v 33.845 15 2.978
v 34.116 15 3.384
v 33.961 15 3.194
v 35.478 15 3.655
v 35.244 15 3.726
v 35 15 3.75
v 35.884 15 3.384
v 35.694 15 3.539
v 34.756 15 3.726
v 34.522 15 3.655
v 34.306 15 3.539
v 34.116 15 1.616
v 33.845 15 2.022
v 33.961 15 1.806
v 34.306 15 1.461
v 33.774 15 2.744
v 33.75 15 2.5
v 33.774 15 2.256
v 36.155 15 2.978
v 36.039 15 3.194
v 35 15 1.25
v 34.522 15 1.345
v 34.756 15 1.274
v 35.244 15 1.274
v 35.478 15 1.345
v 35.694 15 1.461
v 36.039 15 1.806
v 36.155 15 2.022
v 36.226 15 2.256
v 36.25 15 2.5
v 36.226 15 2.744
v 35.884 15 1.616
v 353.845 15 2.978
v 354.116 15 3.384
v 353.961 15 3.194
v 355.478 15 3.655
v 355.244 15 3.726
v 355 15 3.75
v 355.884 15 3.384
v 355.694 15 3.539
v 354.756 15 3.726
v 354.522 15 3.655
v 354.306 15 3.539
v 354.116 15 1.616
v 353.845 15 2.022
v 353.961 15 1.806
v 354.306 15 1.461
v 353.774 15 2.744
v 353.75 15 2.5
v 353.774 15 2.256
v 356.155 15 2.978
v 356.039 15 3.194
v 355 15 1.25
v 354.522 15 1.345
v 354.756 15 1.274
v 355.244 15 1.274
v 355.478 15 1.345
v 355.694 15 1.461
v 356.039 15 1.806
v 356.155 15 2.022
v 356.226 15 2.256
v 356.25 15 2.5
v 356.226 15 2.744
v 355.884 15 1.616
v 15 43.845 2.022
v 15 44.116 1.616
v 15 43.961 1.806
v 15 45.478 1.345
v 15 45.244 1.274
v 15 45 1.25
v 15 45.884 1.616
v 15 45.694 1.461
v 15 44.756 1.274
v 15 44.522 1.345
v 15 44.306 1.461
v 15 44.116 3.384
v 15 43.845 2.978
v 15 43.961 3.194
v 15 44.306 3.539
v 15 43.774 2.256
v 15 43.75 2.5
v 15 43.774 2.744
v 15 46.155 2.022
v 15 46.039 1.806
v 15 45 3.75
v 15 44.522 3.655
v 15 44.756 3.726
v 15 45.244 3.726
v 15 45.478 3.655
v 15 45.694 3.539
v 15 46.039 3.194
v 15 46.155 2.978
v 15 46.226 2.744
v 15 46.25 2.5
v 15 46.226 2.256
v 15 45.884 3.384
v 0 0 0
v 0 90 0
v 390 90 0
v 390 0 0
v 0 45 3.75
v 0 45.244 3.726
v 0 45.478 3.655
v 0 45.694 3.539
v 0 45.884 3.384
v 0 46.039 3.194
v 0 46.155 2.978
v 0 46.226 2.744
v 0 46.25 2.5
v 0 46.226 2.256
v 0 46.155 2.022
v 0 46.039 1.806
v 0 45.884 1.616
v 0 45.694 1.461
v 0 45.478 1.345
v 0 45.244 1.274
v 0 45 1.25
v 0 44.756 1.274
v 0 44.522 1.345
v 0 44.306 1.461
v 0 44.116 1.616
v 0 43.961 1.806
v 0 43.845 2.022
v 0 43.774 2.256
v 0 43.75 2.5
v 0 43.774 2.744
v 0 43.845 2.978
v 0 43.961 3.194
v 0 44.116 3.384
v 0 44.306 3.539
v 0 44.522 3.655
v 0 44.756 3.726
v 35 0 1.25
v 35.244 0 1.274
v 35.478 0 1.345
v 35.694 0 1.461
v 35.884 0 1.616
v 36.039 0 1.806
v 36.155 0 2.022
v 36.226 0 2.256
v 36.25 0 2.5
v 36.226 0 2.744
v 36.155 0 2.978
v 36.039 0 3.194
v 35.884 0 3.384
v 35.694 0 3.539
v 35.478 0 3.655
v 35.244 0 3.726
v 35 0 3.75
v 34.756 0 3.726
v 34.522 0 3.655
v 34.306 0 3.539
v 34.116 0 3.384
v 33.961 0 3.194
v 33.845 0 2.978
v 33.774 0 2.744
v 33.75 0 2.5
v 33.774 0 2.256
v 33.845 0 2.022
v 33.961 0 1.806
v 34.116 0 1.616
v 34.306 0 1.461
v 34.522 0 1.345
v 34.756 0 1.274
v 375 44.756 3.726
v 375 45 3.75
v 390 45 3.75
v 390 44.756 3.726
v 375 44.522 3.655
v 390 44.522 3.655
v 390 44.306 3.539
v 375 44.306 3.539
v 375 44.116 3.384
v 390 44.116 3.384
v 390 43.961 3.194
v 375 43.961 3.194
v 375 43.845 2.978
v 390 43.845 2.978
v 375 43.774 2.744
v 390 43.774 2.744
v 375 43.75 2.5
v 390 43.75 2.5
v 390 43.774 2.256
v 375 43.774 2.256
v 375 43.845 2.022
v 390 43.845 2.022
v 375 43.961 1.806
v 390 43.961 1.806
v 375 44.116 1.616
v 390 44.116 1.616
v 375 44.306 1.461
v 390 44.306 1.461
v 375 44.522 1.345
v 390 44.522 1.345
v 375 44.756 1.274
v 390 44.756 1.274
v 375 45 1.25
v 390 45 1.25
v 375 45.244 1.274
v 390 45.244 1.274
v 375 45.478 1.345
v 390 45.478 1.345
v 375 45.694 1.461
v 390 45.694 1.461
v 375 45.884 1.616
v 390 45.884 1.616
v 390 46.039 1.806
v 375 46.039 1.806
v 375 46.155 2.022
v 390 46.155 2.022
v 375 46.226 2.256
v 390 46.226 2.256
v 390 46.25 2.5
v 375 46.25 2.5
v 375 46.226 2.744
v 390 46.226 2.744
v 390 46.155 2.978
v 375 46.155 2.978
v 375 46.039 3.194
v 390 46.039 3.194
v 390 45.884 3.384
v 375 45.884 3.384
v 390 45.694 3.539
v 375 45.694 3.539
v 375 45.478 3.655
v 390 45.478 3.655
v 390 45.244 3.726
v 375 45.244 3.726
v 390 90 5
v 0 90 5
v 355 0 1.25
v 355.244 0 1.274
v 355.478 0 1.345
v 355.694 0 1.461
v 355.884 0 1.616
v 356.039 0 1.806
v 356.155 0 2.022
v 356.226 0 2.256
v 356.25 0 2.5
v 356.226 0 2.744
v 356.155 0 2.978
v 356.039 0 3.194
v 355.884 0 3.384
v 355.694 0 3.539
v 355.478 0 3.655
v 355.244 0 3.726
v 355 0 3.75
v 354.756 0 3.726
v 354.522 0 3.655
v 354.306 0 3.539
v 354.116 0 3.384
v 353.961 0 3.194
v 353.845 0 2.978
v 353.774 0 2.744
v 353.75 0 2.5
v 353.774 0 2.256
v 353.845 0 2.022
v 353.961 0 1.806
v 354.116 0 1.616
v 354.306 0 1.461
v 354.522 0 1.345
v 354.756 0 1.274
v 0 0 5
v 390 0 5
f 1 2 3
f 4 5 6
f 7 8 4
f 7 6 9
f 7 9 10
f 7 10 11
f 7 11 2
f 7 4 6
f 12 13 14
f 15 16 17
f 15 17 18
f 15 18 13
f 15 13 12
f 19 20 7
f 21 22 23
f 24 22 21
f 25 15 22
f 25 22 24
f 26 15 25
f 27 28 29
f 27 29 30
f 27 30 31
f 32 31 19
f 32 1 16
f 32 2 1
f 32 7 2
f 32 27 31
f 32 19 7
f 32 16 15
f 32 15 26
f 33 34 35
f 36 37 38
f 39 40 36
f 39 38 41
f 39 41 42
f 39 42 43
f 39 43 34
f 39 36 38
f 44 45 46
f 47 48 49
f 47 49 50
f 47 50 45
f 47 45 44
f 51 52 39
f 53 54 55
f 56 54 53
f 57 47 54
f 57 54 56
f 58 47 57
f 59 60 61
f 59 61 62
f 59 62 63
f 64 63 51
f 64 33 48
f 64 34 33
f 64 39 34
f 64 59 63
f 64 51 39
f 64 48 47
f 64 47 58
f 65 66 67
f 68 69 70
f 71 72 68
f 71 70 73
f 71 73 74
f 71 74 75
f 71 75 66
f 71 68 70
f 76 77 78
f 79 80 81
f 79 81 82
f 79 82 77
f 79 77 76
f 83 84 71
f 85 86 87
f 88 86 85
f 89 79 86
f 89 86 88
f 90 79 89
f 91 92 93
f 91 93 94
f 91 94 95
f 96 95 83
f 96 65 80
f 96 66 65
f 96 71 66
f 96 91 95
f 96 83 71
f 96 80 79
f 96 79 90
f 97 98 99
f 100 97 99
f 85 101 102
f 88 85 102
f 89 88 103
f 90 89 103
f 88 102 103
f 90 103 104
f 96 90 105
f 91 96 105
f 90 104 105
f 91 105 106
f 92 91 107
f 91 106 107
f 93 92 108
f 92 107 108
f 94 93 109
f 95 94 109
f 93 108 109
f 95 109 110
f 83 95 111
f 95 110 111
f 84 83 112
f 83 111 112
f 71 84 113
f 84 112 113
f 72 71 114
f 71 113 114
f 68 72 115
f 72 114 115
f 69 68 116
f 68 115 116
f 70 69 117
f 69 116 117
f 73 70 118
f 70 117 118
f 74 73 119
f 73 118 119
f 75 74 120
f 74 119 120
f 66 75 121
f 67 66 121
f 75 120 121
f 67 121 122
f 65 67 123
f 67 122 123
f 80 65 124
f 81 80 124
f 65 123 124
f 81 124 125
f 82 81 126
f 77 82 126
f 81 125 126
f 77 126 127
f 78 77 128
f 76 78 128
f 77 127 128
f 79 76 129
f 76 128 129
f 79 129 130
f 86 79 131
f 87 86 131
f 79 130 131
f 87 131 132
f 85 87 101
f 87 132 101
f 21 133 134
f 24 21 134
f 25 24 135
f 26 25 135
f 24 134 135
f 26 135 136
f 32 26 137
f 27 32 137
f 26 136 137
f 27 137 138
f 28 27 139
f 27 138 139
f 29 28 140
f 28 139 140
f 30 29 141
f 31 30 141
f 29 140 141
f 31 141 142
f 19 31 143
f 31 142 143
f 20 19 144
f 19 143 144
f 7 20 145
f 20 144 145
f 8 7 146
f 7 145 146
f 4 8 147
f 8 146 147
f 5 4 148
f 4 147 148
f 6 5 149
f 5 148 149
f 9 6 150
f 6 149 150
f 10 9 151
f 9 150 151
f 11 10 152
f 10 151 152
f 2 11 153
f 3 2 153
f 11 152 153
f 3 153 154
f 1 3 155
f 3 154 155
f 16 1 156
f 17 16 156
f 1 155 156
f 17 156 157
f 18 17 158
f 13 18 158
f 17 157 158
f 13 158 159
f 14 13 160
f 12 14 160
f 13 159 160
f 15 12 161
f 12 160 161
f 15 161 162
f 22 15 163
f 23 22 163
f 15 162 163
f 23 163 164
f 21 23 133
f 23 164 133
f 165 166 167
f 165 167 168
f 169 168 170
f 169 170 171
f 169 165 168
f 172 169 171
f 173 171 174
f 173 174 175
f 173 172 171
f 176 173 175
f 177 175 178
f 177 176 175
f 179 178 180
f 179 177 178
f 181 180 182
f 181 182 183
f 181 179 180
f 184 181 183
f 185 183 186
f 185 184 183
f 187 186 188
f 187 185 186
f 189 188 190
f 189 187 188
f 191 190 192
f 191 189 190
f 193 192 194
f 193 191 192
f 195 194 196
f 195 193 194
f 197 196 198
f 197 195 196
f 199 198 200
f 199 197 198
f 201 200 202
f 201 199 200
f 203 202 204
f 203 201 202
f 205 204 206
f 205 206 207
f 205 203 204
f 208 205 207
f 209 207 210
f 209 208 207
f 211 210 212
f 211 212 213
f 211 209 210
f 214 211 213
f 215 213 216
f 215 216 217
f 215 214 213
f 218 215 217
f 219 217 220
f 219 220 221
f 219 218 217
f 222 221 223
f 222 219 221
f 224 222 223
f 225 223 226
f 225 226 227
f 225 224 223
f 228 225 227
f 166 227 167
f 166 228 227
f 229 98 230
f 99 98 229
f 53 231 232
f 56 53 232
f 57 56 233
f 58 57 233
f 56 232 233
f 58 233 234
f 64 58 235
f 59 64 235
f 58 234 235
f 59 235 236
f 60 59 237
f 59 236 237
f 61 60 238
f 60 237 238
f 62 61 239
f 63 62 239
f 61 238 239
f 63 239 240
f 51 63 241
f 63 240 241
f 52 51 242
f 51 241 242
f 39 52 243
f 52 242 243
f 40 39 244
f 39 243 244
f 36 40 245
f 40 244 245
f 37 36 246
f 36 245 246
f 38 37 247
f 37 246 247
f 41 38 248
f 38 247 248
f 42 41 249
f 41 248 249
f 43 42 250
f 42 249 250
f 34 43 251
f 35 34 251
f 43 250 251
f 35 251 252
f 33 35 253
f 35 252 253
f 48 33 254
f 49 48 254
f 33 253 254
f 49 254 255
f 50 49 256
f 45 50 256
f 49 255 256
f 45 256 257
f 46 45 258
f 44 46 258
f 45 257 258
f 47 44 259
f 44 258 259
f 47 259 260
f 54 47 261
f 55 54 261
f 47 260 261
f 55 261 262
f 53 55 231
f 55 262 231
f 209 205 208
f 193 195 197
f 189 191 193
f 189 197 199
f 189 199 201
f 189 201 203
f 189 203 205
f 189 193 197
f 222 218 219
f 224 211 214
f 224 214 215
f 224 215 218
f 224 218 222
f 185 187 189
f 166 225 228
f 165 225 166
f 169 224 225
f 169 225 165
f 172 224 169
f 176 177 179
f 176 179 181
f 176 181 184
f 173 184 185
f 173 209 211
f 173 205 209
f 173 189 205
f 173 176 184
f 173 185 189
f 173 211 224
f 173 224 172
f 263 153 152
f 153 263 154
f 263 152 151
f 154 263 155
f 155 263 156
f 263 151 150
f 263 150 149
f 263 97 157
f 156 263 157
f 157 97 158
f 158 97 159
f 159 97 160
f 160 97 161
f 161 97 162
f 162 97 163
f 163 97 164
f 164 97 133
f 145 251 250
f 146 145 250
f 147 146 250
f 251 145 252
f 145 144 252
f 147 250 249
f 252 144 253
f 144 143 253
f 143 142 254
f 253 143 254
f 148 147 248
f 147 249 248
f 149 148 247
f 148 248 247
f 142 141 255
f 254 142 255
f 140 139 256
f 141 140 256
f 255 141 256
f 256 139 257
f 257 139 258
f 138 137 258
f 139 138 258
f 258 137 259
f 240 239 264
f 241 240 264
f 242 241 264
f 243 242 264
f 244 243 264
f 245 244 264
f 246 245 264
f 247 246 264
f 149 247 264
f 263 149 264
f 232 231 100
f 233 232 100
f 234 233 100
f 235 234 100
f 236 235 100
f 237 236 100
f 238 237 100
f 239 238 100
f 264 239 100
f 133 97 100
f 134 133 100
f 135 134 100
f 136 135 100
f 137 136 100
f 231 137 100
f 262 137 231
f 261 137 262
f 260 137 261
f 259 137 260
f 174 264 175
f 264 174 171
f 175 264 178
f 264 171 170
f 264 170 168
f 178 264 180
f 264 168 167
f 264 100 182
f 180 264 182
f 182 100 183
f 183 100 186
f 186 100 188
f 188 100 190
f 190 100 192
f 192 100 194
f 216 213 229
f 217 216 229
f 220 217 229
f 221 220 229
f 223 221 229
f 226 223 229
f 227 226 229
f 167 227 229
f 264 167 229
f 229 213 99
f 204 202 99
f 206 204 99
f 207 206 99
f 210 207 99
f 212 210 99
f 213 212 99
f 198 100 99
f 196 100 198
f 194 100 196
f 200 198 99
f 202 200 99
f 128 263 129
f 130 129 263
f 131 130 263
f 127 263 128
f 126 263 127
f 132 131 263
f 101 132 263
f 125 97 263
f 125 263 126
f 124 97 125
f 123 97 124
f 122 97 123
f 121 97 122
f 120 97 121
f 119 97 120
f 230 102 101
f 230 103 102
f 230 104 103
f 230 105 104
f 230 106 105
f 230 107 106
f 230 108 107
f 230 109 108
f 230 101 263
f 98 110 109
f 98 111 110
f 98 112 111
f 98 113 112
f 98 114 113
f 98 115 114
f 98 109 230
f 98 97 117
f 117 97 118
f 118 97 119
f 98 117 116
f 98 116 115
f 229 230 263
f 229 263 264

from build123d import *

# Parameters (mm, degrees)
SKETCH1_W           = 390
SKETCH1_H           = 90
BOSS_EXTRUDE1_DEPTH = 5
SKETCH2_R           = 1.25
CUT_EXTRUDE1_DEPTH  = 15
SKETCH3_R           = 1.25
CUT_EXTRUDE2_DEPTH  = 15
CUT_EXTRUDE3_START  = -15
SKETCH4_R           = 1.25
CUT_EXTRUDE3_DEPTH  = 15


with BuildPart() as part:
    # Sketch1 → Boss-Extrude1 (new body)
    with BuildSketch(Plane.XY):
        with Locations((195, 45)):
            Rectangle(SKETCH1_W, SKETCH1_H)
    extrude(amount=BOSS_EXTRUDE1_DEPTH)

    # Sketch2 → Cut-Extrude1 (cut)
    with BuildSketch(Plane.ZY):
        with Locations((2.5, 45)):
            Circle(SKETCH2_R)
    extrude(amount=-CUT_EXTRUDE1_DEPTH, mode=Mode.SUBTRACT)

    # Sketch3 → Cut-Extrude2 (cut)
    with BuildSketch(Plane(origin=(0, 0, 0), x_dir=(-1, 0, 0), z_dir=(0, -1, 0))):
        with Locations(Location((-35, -2.5, 0), (0, 0, 90))):
            Circle(SKETCH3_R)
        with Locations(Location((-355, -2.5, 0), (0, 0, 90))):
            Circle(SKETCH3_R)
    extrude(amount=-CUT_EXTRUDE2_DEPTH, mode=Mode.SUBTRACT)

    # Sketch4 → Cut-Extrude3 (cut)
    with BuildSketch(Plane(origin=(390, 0, 0), x_dir=(0, 0, -1), z_dir=(1, 0, 0)).offset(CUT_EXTRUDE3_START)):
        with Locations(Location((-2.5, 45, 0), (0, 0, 180))):
            Circle(SKETCH4_R)
    extrude(amount=CUT_EXTRUDE3_DEPTH, mode=Mode.SUBTRACT)


solid = part.part
